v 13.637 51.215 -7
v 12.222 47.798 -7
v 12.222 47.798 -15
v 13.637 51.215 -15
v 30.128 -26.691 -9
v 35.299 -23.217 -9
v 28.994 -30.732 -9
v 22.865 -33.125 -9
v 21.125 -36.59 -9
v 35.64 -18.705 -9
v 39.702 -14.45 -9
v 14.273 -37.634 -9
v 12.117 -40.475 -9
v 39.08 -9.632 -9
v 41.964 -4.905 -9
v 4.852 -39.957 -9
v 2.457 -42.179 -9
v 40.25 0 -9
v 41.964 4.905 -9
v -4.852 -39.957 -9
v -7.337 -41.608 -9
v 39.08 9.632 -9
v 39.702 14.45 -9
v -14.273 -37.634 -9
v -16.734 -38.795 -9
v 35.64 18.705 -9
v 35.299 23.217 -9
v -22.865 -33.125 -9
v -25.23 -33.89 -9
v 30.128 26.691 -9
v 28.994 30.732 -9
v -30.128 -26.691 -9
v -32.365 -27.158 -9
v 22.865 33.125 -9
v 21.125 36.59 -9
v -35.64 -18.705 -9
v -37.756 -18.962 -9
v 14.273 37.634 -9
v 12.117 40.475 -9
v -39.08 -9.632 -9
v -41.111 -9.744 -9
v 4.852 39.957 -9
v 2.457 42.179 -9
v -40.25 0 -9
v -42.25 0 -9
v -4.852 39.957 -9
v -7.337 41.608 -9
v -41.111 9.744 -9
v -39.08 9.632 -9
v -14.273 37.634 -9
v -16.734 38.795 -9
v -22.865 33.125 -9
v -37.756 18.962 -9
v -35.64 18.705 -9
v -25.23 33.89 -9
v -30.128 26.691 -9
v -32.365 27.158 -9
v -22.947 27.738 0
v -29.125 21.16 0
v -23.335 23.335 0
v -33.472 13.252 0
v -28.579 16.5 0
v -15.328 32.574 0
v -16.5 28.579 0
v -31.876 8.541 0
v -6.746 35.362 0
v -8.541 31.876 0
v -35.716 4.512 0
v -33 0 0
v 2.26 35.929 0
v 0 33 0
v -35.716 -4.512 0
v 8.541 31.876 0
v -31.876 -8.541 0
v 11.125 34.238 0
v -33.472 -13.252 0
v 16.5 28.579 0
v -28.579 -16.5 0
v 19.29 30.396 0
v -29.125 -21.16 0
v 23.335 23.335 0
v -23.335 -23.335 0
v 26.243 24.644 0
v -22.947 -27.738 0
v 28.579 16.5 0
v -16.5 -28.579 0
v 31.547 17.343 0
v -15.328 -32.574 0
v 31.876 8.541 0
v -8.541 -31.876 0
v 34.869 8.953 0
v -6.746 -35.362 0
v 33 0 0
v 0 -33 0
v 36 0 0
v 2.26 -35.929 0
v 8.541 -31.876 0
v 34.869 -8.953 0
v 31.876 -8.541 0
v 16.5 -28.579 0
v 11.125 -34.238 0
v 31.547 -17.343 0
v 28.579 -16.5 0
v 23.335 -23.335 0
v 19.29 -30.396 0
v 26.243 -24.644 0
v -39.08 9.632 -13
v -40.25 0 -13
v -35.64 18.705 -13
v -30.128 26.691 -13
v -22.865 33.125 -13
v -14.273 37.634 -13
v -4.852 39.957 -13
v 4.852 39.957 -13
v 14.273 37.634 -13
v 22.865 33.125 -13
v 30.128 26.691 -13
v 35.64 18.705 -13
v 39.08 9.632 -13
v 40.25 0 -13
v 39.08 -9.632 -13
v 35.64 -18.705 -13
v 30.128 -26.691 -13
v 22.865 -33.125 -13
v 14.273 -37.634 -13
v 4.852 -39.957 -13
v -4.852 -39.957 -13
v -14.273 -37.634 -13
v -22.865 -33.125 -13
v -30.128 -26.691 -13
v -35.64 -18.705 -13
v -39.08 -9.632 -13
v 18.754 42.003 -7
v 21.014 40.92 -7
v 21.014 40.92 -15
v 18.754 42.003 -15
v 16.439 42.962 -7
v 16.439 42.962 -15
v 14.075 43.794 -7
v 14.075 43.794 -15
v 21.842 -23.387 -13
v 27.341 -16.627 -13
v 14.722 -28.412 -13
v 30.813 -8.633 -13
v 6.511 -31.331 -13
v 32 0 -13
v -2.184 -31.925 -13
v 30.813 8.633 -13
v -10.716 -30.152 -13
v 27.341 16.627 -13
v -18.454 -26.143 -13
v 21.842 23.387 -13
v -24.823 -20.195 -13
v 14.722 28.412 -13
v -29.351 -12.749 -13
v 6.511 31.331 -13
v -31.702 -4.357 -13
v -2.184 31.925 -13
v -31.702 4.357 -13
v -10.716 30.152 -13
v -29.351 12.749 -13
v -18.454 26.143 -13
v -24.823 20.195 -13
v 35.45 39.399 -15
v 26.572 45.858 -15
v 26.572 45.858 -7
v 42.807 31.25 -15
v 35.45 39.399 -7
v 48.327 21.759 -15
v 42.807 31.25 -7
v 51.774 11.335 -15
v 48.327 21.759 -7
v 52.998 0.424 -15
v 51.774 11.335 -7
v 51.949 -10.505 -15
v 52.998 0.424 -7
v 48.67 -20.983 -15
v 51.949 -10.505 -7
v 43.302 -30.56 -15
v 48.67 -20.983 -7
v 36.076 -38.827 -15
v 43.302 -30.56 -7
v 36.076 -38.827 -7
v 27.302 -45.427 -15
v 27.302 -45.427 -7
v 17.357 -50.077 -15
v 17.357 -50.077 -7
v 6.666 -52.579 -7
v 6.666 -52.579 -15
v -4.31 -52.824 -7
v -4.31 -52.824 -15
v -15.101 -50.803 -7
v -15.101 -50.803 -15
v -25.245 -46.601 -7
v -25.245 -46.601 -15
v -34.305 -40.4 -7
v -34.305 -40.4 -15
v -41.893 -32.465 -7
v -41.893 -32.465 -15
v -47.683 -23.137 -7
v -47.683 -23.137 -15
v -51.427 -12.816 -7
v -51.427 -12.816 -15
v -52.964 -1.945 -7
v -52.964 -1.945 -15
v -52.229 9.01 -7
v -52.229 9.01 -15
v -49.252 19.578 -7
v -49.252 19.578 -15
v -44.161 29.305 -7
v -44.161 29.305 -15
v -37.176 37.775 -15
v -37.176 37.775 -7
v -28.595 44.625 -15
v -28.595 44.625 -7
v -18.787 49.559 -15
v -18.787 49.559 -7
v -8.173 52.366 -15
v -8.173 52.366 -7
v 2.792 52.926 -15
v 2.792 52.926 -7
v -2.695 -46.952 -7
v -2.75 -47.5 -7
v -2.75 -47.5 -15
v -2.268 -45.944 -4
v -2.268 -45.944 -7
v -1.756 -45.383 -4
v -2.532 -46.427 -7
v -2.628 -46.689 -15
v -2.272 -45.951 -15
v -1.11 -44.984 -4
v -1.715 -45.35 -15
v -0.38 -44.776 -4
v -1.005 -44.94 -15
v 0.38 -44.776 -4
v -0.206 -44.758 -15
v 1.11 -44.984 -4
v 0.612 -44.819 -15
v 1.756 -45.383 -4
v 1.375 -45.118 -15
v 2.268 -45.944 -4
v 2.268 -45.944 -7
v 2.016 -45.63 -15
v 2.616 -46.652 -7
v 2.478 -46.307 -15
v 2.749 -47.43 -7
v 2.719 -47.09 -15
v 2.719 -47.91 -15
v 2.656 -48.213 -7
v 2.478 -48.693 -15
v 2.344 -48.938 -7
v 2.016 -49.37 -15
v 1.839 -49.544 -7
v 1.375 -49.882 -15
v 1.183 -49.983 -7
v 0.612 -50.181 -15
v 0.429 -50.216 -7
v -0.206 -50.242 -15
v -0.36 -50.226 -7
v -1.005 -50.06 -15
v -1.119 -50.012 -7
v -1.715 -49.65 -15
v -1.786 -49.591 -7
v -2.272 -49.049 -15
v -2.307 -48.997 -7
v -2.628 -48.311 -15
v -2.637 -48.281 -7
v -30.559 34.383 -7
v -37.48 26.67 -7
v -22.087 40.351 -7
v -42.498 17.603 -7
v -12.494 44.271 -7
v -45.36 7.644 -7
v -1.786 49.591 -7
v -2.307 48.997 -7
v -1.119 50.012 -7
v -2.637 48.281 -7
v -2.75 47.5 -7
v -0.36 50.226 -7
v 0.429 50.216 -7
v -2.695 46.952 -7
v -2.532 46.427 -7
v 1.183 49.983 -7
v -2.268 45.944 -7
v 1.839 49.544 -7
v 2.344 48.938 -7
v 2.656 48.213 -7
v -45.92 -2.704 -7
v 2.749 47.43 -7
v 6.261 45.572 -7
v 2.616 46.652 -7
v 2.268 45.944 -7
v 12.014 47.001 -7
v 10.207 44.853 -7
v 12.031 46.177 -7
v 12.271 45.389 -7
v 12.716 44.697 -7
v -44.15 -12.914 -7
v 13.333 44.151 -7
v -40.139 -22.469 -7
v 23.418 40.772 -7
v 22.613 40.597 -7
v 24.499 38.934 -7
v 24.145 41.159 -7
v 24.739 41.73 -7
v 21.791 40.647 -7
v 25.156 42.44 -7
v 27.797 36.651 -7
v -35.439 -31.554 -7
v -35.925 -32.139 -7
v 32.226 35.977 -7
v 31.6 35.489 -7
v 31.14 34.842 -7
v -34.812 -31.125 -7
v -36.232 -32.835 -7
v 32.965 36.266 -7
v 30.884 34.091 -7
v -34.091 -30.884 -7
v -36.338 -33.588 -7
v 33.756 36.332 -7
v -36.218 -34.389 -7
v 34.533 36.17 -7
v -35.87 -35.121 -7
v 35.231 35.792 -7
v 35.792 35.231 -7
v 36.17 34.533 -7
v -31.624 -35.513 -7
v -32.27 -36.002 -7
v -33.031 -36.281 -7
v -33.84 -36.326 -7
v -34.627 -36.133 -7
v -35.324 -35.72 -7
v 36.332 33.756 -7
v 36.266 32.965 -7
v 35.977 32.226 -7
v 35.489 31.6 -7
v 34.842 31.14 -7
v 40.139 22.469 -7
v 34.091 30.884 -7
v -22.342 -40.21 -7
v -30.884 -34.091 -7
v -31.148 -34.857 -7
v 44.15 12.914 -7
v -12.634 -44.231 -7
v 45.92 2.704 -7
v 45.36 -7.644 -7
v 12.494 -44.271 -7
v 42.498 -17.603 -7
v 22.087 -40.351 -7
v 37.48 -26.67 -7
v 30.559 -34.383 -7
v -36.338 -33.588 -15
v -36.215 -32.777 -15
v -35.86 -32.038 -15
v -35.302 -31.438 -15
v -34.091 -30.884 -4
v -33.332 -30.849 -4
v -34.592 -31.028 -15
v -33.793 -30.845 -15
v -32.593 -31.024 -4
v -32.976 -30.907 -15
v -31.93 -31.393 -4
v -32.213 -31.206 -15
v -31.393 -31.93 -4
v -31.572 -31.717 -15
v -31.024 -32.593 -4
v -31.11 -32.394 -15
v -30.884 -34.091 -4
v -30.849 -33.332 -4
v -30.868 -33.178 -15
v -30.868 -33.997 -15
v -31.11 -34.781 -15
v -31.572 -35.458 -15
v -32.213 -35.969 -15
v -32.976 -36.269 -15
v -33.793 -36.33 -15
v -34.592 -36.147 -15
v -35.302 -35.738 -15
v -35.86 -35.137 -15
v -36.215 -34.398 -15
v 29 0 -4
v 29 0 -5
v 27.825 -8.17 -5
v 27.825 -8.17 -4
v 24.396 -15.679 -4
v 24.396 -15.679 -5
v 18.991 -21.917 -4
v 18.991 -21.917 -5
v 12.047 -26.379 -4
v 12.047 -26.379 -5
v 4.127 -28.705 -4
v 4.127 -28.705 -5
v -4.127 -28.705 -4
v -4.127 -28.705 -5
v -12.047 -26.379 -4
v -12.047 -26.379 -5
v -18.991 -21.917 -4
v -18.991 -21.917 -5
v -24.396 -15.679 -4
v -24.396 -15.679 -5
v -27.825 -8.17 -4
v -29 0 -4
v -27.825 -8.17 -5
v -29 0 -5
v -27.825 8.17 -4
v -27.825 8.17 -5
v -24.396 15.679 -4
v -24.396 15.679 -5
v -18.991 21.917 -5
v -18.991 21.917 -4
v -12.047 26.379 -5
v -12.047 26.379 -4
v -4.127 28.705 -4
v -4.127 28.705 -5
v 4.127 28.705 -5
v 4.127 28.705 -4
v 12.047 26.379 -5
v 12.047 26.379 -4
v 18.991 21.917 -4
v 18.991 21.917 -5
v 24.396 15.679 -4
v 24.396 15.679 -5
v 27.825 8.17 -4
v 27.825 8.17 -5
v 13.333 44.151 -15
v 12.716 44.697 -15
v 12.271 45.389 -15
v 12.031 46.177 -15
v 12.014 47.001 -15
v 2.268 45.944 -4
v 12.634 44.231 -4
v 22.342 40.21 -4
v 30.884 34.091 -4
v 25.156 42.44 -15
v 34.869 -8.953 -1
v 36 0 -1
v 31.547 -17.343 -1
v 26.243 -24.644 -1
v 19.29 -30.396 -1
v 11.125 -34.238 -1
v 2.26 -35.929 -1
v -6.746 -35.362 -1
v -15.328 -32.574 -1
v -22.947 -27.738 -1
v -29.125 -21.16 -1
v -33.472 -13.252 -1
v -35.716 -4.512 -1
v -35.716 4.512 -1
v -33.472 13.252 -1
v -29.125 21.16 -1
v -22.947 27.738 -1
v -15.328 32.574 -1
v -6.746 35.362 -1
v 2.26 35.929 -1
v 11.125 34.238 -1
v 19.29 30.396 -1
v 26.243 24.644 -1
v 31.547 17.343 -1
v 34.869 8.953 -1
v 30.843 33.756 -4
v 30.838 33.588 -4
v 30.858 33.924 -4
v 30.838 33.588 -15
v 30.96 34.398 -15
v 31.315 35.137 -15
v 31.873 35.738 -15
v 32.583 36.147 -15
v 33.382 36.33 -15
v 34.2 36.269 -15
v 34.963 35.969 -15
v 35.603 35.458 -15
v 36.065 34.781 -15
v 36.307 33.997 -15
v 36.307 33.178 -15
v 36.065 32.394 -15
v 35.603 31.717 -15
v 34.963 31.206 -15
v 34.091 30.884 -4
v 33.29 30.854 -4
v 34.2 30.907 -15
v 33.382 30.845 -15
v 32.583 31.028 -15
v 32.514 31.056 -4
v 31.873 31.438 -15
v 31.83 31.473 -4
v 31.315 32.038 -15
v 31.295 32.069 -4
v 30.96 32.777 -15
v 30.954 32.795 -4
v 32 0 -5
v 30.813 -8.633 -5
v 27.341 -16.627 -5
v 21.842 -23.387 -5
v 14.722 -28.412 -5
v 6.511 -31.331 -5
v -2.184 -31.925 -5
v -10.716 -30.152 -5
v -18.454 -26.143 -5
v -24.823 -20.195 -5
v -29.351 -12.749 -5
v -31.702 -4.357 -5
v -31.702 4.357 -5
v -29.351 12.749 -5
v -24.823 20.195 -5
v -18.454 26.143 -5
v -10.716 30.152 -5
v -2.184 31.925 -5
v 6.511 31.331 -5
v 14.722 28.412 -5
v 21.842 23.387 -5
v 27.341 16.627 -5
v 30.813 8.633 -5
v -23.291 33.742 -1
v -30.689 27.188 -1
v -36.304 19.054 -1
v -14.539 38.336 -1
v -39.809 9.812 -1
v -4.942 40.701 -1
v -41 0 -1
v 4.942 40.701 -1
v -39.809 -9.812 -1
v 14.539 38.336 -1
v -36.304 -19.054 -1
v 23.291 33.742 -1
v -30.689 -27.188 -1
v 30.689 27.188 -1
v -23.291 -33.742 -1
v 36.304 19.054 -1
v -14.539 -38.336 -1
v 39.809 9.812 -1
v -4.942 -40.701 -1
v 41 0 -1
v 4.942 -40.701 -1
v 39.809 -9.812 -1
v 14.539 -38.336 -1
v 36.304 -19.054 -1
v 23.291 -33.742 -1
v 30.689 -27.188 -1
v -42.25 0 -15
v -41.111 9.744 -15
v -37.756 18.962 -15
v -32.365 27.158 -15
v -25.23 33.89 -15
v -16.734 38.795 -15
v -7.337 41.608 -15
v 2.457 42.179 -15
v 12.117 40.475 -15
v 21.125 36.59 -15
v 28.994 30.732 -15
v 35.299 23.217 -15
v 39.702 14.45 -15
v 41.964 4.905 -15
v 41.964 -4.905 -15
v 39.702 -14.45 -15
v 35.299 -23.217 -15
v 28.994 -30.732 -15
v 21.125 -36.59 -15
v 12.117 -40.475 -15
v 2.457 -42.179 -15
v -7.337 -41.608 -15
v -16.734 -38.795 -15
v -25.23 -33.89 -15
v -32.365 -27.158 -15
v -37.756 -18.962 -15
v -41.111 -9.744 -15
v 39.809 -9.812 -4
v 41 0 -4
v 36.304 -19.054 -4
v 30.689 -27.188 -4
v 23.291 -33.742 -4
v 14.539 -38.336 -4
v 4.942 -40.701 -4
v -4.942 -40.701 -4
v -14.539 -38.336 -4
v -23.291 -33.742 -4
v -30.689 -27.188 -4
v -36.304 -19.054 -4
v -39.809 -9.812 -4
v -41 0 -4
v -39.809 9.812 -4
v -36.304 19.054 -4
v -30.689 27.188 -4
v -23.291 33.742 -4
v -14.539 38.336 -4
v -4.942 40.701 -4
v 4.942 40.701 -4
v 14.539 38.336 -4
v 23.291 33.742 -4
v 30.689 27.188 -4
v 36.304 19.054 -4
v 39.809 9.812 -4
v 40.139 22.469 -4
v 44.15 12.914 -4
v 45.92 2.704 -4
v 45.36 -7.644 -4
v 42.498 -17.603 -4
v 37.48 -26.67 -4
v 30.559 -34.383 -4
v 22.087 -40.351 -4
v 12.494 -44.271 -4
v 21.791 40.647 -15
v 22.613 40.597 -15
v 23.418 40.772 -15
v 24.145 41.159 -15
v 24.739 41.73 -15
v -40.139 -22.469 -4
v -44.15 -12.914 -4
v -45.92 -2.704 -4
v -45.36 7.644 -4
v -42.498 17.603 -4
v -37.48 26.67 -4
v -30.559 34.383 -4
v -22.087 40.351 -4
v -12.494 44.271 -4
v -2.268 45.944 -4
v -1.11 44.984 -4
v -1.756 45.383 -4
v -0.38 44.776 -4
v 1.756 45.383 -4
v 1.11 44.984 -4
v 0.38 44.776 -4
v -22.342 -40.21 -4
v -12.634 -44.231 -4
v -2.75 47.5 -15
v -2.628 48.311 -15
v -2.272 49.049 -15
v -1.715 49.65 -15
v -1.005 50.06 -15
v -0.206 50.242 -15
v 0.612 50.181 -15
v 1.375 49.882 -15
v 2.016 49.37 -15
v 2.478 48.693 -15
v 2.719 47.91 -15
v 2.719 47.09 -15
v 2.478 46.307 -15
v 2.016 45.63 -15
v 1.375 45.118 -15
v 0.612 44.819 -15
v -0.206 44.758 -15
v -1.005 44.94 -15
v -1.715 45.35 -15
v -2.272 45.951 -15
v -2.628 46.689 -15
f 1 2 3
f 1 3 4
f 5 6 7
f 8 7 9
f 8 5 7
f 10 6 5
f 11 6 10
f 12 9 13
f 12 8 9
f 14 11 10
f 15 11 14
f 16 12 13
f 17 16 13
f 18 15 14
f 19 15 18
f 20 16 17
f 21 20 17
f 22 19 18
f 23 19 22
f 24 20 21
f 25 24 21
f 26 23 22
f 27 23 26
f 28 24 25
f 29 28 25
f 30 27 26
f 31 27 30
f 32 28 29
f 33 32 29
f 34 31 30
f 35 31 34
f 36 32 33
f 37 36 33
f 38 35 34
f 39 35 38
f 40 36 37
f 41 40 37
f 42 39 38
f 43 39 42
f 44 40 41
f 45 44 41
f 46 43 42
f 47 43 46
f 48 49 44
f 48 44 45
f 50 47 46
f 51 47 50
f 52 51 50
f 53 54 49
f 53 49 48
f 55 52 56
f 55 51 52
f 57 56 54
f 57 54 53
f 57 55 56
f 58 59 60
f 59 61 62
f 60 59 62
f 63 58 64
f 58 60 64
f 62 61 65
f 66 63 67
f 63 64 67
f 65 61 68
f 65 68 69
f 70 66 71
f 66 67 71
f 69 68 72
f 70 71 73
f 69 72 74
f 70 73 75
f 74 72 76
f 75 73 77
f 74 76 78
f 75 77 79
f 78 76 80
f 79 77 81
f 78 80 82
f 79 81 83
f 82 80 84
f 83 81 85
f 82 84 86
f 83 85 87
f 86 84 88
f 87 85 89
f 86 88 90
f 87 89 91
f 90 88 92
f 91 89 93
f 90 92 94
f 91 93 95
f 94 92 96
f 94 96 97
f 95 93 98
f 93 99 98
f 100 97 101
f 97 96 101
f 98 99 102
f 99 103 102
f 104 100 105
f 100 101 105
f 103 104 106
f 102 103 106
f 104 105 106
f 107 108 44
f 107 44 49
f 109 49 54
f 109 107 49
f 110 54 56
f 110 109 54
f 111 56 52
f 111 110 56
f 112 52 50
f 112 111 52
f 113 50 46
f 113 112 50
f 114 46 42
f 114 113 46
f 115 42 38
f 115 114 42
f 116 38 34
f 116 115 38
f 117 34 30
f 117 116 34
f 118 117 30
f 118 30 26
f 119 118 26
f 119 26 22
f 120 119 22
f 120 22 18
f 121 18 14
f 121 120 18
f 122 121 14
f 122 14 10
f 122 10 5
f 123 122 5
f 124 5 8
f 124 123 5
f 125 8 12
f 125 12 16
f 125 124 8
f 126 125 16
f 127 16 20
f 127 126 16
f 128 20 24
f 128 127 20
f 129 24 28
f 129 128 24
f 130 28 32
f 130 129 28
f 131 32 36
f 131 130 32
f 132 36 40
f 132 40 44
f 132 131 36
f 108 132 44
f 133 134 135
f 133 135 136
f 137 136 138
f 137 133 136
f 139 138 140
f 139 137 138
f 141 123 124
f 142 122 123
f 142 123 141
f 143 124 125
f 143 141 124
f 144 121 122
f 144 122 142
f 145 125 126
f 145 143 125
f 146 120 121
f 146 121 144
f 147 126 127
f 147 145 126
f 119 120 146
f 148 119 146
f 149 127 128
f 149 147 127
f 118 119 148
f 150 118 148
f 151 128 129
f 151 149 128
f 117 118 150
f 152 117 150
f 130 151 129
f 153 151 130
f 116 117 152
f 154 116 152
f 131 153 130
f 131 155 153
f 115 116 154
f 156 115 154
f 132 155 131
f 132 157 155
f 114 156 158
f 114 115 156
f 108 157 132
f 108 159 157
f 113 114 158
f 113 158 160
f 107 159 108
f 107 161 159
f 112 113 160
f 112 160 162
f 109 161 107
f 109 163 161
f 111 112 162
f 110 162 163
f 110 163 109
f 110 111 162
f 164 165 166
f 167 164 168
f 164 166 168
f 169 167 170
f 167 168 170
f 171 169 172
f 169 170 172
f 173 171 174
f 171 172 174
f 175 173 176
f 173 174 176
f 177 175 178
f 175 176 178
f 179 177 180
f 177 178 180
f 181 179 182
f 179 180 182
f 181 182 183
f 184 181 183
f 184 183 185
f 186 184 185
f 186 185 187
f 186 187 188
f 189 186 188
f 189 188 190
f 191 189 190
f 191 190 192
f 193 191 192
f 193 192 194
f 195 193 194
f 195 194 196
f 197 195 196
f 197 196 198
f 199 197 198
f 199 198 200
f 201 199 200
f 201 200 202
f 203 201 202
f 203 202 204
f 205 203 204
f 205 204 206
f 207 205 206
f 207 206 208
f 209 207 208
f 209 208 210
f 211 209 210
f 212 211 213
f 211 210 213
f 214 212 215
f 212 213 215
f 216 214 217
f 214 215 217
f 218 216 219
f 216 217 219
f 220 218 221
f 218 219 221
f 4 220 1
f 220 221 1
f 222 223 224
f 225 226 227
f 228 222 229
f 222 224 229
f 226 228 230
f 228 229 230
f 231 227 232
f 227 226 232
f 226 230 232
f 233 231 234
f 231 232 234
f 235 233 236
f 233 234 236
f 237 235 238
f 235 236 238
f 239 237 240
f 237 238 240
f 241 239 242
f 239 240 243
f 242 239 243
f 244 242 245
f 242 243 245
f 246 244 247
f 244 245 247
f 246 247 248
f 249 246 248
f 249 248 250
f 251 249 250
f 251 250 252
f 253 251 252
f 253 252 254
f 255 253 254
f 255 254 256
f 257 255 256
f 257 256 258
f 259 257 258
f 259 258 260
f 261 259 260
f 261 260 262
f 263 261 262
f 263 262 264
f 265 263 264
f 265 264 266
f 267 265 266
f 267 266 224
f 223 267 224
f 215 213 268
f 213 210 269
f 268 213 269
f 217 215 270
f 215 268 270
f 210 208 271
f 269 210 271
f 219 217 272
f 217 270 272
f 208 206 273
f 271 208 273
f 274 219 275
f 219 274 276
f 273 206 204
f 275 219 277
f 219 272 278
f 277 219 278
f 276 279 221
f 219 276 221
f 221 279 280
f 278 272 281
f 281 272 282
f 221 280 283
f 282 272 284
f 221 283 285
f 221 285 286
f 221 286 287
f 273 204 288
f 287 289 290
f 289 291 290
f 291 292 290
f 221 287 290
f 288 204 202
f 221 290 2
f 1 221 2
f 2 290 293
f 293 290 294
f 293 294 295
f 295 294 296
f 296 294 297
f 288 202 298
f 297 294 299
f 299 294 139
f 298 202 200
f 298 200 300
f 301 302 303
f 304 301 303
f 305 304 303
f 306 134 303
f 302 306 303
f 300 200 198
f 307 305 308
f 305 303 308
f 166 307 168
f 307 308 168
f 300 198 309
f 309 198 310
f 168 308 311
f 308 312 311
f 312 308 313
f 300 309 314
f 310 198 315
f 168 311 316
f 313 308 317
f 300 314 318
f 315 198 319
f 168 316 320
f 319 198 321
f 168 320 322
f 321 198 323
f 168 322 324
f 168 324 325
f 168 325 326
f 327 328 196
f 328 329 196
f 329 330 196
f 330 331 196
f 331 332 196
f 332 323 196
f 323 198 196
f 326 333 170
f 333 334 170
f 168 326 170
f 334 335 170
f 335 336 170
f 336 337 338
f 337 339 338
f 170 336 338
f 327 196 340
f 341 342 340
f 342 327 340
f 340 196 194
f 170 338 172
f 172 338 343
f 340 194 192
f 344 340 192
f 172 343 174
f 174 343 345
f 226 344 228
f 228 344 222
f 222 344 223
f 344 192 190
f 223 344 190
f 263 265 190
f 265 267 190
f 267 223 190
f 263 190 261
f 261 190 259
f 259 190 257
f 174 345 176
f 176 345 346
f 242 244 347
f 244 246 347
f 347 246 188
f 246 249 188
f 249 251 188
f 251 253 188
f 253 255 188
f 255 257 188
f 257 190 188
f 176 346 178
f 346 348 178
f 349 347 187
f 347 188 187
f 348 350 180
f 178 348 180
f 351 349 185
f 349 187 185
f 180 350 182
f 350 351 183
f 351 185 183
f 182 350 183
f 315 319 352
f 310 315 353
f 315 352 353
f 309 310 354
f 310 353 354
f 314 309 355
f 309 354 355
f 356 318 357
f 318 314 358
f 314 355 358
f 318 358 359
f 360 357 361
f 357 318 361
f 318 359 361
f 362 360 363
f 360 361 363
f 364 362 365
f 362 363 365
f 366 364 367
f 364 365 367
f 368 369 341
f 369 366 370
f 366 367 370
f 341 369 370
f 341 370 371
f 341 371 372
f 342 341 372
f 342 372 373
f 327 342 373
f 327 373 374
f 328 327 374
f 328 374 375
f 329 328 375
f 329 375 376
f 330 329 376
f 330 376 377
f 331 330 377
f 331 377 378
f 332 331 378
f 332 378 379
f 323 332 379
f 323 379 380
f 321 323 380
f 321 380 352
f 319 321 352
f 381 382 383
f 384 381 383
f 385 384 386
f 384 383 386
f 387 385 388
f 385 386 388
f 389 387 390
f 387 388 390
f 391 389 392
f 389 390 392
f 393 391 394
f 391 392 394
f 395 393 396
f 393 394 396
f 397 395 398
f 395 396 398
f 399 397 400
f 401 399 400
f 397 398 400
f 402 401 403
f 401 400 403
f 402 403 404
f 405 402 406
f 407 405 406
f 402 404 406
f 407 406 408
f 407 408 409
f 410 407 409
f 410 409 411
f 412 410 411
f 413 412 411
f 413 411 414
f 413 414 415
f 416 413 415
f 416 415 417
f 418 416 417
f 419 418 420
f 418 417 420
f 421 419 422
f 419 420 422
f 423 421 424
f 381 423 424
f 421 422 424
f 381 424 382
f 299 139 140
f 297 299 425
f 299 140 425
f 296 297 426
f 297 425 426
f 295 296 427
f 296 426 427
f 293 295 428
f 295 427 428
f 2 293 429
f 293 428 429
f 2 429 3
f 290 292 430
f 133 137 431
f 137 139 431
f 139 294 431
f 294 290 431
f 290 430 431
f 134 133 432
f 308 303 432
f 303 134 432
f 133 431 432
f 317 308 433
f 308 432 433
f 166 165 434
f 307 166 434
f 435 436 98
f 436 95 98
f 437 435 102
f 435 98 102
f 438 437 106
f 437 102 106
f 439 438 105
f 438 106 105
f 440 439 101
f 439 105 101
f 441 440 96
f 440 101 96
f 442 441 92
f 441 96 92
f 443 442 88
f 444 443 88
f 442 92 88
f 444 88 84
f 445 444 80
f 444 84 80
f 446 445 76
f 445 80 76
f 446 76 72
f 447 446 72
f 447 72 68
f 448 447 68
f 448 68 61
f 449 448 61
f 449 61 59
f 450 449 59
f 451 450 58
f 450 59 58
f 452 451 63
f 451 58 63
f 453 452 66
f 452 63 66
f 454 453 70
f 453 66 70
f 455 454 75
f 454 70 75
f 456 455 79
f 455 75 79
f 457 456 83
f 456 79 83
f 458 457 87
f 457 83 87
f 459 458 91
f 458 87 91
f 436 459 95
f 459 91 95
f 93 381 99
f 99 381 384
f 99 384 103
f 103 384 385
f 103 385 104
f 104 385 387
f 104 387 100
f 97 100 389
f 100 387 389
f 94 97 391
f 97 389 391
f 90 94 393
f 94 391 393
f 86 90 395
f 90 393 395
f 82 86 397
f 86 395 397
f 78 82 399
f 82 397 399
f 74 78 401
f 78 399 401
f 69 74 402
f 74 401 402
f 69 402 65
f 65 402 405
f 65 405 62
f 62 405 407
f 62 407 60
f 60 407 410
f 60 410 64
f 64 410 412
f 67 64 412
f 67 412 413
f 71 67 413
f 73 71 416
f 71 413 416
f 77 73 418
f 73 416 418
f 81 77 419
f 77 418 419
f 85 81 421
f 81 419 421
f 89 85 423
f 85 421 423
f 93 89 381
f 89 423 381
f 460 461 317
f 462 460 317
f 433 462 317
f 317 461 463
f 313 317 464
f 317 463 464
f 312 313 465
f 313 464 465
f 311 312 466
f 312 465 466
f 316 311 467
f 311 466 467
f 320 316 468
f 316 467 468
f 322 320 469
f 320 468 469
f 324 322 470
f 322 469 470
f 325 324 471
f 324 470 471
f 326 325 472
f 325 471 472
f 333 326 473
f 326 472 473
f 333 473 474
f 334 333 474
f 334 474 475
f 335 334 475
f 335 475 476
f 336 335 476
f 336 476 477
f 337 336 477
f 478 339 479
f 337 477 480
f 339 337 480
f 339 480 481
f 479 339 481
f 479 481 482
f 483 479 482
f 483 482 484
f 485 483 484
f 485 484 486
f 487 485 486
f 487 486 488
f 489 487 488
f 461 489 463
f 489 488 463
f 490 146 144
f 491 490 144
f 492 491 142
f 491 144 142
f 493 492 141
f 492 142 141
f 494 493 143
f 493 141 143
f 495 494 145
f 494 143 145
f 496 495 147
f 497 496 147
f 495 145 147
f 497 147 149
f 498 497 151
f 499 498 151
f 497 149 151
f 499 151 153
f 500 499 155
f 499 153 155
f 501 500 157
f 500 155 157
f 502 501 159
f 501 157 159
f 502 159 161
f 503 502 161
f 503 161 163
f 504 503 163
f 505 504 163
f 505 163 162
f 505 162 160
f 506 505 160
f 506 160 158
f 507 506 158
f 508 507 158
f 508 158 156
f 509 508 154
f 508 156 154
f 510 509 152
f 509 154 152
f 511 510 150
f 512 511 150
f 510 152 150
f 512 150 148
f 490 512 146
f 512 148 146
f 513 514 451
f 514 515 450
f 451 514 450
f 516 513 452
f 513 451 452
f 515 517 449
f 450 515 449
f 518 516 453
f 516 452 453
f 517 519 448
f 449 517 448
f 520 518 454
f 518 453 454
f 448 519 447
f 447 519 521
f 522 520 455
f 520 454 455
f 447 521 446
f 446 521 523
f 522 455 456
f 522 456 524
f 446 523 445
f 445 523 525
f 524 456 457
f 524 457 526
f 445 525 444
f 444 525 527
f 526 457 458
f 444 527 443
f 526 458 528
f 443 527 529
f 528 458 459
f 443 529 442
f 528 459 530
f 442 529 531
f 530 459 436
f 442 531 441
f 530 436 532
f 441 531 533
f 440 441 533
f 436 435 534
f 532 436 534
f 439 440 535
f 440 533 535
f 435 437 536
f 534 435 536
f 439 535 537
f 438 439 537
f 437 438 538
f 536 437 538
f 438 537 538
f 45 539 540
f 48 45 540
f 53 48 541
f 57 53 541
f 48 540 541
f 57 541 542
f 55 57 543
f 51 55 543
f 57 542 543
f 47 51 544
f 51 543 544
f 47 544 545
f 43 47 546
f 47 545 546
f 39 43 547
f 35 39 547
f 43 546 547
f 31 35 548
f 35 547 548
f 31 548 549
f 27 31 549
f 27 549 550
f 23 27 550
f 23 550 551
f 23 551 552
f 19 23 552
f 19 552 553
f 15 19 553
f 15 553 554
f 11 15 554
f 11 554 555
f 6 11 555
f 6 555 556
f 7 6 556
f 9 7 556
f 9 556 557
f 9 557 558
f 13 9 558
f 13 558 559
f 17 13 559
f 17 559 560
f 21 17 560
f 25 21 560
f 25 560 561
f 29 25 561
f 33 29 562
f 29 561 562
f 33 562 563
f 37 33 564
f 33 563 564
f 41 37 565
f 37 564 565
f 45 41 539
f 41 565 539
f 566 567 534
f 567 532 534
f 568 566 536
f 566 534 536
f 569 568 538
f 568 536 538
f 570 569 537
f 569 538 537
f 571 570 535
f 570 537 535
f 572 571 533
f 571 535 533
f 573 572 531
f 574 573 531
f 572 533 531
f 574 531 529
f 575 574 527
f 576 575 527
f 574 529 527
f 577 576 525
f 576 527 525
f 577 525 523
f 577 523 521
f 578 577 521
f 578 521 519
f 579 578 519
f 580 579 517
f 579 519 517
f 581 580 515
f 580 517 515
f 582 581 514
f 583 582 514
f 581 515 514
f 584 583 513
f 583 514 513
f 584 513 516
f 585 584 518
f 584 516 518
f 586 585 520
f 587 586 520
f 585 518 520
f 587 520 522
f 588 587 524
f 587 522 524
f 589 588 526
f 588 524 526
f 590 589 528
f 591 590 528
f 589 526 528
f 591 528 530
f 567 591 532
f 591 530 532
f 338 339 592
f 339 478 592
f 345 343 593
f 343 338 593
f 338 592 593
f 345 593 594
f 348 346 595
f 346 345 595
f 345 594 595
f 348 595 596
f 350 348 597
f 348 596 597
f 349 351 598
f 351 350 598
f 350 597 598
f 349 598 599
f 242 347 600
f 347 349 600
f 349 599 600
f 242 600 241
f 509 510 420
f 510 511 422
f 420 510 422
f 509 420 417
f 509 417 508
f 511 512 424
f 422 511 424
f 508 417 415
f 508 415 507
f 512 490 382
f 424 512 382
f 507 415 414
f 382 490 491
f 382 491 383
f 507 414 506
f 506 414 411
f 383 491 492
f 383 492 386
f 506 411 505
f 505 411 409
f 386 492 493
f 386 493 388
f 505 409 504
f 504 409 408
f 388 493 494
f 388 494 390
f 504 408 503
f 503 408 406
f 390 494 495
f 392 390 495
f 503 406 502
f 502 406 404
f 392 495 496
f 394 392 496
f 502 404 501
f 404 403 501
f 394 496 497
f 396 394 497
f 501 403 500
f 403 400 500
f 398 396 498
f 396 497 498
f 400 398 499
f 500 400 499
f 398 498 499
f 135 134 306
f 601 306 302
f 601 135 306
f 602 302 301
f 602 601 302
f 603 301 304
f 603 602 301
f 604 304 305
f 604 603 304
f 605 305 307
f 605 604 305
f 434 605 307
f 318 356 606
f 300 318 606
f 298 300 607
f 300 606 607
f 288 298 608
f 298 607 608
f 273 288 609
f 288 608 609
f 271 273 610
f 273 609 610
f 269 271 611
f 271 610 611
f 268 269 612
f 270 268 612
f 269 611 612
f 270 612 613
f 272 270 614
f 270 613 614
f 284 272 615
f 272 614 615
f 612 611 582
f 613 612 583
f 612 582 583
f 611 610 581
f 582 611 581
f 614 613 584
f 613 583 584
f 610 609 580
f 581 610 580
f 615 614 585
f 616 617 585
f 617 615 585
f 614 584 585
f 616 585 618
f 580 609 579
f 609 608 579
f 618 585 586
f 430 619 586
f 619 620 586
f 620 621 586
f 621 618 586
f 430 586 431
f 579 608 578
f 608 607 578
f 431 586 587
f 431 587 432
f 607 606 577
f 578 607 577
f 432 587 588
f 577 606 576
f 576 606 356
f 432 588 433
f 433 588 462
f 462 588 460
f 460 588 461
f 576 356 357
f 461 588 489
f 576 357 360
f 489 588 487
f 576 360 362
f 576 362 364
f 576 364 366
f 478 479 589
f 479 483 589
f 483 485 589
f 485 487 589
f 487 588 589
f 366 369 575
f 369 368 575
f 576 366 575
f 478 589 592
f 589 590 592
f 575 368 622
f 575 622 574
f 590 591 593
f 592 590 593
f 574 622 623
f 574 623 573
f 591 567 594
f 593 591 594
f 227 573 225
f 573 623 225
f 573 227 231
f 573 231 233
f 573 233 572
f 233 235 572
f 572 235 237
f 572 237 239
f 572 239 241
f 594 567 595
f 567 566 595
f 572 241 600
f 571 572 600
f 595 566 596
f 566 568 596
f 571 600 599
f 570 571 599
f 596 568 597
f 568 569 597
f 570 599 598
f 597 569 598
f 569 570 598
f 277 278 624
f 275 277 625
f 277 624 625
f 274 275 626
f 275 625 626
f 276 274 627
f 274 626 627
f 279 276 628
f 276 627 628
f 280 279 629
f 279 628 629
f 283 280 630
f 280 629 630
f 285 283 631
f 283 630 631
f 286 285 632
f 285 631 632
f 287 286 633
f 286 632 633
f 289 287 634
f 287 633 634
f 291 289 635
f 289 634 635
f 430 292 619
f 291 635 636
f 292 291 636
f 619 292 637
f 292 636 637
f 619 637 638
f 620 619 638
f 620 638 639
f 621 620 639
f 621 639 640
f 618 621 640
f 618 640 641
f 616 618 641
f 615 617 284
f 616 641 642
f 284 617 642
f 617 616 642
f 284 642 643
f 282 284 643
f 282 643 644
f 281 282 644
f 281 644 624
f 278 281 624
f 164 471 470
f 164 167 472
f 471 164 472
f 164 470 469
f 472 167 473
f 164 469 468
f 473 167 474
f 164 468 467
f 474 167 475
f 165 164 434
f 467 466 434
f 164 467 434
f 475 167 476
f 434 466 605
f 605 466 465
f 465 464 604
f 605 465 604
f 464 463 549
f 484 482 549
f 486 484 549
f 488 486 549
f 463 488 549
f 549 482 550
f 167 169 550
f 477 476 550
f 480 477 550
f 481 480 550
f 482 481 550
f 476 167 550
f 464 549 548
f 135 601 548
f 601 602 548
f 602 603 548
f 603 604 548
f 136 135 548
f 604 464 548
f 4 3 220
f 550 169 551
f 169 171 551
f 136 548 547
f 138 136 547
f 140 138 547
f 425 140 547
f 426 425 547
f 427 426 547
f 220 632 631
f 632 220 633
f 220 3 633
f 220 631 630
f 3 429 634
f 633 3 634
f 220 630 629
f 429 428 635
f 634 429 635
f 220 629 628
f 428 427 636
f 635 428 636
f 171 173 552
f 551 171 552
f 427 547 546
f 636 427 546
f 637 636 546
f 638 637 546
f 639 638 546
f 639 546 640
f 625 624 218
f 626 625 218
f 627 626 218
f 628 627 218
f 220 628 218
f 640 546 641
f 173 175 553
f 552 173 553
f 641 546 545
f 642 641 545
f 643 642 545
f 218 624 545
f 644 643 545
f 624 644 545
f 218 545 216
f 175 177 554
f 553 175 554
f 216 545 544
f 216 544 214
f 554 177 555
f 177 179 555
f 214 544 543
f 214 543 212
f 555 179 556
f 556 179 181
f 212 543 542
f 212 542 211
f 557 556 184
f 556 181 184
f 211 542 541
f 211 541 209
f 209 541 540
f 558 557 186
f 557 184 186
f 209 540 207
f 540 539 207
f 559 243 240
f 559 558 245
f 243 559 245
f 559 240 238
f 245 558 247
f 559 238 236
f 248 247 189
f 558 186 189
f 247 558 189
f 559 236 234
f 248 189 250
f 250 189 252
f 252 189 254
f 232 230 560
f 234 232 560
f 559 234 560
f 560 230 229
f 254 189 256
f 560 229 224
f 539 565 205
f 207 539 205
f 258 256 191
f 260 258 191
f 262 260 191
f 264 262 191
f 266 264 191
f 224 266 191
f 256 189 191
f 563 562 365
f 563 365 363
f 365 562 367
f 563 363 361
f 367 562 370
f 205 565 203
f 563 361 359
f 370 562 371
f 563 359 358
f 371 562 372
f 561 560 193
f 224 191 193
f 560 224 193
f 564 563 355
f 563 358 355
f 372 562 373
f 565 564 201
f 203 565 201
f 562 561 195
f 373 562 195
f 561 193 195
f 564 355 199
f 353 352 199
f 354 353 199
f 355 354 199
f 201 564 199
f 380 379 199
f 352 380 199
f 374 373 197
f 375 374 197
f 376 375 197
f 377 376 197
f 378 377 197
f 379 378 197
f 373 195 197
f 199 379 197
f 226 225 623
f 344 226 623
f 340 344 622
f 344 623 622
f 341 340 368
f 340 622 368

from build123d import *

# Parameters (mm, degrees)
CHAMFER1_SIZE      = 4
SKETCH5_R          = 2.75
CUT_EXTRUDE4_DEPTH = 20
CUT_EXTRUDE5_DEPTH = 76.37904218
FILLET2_R          = 3
SKETCH7_R          = 42.25
CUT_EXTRUDE6_DEPTH = 2
SKETCH8_R          = 42.25
SKETCH8_R_2        = 40.25
CUT_EXTRUDE7_DEPTH = 4


with BuildPart() as part:
    # Sketch1 → Revolve1 (revolve)
    with BuildSketch(Plane(origin=(0, 0, 0), x_dir=(0, 0, -1), z_dir=(1, 0, 0)), mode=Mode.PRIVATE) as revolve1_sk:
        Polygon((5, 29), (5, 32), (15, 32), (15, 53), (7, 53), (7, 46), (4, 46), (4, 41), (1, 41), (1, 36), (0, 36), (0, 29), align=None)
    revolve(revolve1_sk.sketch.rotate(Axis((0, 0, 0), (0, 0, -1)), 90), axis=Axis((0, 0, 0), (0, 0, -1)))

    # Chamfer1
    chamfer1_edges = [part.edges().sort_by_distance(p)[0] for p in [
        (-29, 0, 0),
    ]]
    chamfer(chamfer1_edges, length=CHAMFER1_SIZE)

    # Sketch5 → Cut-Extrude4 (cut)
    with BuildSketch(Plane(origin=(0, 0, -15), x_dir=(-1, 0, 0), z_dir=(0, 0, -1))):
        with Locations((0, 47.5)):
            Circle(SKETCH5_R)
        with Locations((33.587572106, -33.587572106)):
            Circle(SKETCH5_R)
        with Locations((0, -47.5)):
            Circle(SKETCH5_R)
        with Locations((-33.587572106, 33.587572106)):
            Circle(SKETCH5_R)
    extrude(amount=-CUT_EXTRUDE4_DEPTH, mode=Mode.SUBTRACT)

    # Sketch6 → Cut-Extrude5 (cut, through all)
    with BuildSketch(Plane.XY.offset(-7)):
        with BuildLine():
            Line((26.571699547, 45.857875912), (23.865580267, 39.324726045))
            ThreePointArc((23.865580267, 39.324726045), (17.603437889, 42.498458496), (10.931266811, 44.682294098))
            Line((10.931266811, 44.682294098), (13.637386091, 51.215443966))
            ThreePointArc((13.637386091, 51.215443966), (20.282221915, 48.965615223), (26.571699547, 45.857875912))
        make_face()
    extrude(amount=-CUT_EXTRUDE5_DEPTH, mode=Mode.SUBTRACT)

    # Fillet2
    fillet2_edges = [part.edges().sort_by_distance(p)[0] for p in [
        (23.865580267, 39.324726045, -11),
        (10.931266811, 44.682294098, -11),
    ]]
    fillet(fillet2_edges, radius=FILLET2_R)

    # Sketch7 → Cut-Extrude6 (cut)
    with BuildSketch(Plane(origin=(0, 0, -15), x_dir=(-1, 0, 0), z_dir=(0, 0, -1))):
        Circle(SKETCH7_R)
    extrude(amount=-CUT_EXTRUDE6_DEPTH, mode=Mode.SUBTRACT)

    # Sketch8 → Cut-Extrude7 (cut)
    with BuildSketch(Plane(origin=(0, 0, -13), x_dir=(-1, 0, 0), z_dir=(0, 0, -1))):
        Circle(SKETCH8_R)
        Circle(SKETCH8_R_2, mode=Mode.SUBTRACT)
    extrude(amount=-CUT_EXTRUDE7_DEPTH, mode=Mode.SUBTRACT)


solid = part.part
